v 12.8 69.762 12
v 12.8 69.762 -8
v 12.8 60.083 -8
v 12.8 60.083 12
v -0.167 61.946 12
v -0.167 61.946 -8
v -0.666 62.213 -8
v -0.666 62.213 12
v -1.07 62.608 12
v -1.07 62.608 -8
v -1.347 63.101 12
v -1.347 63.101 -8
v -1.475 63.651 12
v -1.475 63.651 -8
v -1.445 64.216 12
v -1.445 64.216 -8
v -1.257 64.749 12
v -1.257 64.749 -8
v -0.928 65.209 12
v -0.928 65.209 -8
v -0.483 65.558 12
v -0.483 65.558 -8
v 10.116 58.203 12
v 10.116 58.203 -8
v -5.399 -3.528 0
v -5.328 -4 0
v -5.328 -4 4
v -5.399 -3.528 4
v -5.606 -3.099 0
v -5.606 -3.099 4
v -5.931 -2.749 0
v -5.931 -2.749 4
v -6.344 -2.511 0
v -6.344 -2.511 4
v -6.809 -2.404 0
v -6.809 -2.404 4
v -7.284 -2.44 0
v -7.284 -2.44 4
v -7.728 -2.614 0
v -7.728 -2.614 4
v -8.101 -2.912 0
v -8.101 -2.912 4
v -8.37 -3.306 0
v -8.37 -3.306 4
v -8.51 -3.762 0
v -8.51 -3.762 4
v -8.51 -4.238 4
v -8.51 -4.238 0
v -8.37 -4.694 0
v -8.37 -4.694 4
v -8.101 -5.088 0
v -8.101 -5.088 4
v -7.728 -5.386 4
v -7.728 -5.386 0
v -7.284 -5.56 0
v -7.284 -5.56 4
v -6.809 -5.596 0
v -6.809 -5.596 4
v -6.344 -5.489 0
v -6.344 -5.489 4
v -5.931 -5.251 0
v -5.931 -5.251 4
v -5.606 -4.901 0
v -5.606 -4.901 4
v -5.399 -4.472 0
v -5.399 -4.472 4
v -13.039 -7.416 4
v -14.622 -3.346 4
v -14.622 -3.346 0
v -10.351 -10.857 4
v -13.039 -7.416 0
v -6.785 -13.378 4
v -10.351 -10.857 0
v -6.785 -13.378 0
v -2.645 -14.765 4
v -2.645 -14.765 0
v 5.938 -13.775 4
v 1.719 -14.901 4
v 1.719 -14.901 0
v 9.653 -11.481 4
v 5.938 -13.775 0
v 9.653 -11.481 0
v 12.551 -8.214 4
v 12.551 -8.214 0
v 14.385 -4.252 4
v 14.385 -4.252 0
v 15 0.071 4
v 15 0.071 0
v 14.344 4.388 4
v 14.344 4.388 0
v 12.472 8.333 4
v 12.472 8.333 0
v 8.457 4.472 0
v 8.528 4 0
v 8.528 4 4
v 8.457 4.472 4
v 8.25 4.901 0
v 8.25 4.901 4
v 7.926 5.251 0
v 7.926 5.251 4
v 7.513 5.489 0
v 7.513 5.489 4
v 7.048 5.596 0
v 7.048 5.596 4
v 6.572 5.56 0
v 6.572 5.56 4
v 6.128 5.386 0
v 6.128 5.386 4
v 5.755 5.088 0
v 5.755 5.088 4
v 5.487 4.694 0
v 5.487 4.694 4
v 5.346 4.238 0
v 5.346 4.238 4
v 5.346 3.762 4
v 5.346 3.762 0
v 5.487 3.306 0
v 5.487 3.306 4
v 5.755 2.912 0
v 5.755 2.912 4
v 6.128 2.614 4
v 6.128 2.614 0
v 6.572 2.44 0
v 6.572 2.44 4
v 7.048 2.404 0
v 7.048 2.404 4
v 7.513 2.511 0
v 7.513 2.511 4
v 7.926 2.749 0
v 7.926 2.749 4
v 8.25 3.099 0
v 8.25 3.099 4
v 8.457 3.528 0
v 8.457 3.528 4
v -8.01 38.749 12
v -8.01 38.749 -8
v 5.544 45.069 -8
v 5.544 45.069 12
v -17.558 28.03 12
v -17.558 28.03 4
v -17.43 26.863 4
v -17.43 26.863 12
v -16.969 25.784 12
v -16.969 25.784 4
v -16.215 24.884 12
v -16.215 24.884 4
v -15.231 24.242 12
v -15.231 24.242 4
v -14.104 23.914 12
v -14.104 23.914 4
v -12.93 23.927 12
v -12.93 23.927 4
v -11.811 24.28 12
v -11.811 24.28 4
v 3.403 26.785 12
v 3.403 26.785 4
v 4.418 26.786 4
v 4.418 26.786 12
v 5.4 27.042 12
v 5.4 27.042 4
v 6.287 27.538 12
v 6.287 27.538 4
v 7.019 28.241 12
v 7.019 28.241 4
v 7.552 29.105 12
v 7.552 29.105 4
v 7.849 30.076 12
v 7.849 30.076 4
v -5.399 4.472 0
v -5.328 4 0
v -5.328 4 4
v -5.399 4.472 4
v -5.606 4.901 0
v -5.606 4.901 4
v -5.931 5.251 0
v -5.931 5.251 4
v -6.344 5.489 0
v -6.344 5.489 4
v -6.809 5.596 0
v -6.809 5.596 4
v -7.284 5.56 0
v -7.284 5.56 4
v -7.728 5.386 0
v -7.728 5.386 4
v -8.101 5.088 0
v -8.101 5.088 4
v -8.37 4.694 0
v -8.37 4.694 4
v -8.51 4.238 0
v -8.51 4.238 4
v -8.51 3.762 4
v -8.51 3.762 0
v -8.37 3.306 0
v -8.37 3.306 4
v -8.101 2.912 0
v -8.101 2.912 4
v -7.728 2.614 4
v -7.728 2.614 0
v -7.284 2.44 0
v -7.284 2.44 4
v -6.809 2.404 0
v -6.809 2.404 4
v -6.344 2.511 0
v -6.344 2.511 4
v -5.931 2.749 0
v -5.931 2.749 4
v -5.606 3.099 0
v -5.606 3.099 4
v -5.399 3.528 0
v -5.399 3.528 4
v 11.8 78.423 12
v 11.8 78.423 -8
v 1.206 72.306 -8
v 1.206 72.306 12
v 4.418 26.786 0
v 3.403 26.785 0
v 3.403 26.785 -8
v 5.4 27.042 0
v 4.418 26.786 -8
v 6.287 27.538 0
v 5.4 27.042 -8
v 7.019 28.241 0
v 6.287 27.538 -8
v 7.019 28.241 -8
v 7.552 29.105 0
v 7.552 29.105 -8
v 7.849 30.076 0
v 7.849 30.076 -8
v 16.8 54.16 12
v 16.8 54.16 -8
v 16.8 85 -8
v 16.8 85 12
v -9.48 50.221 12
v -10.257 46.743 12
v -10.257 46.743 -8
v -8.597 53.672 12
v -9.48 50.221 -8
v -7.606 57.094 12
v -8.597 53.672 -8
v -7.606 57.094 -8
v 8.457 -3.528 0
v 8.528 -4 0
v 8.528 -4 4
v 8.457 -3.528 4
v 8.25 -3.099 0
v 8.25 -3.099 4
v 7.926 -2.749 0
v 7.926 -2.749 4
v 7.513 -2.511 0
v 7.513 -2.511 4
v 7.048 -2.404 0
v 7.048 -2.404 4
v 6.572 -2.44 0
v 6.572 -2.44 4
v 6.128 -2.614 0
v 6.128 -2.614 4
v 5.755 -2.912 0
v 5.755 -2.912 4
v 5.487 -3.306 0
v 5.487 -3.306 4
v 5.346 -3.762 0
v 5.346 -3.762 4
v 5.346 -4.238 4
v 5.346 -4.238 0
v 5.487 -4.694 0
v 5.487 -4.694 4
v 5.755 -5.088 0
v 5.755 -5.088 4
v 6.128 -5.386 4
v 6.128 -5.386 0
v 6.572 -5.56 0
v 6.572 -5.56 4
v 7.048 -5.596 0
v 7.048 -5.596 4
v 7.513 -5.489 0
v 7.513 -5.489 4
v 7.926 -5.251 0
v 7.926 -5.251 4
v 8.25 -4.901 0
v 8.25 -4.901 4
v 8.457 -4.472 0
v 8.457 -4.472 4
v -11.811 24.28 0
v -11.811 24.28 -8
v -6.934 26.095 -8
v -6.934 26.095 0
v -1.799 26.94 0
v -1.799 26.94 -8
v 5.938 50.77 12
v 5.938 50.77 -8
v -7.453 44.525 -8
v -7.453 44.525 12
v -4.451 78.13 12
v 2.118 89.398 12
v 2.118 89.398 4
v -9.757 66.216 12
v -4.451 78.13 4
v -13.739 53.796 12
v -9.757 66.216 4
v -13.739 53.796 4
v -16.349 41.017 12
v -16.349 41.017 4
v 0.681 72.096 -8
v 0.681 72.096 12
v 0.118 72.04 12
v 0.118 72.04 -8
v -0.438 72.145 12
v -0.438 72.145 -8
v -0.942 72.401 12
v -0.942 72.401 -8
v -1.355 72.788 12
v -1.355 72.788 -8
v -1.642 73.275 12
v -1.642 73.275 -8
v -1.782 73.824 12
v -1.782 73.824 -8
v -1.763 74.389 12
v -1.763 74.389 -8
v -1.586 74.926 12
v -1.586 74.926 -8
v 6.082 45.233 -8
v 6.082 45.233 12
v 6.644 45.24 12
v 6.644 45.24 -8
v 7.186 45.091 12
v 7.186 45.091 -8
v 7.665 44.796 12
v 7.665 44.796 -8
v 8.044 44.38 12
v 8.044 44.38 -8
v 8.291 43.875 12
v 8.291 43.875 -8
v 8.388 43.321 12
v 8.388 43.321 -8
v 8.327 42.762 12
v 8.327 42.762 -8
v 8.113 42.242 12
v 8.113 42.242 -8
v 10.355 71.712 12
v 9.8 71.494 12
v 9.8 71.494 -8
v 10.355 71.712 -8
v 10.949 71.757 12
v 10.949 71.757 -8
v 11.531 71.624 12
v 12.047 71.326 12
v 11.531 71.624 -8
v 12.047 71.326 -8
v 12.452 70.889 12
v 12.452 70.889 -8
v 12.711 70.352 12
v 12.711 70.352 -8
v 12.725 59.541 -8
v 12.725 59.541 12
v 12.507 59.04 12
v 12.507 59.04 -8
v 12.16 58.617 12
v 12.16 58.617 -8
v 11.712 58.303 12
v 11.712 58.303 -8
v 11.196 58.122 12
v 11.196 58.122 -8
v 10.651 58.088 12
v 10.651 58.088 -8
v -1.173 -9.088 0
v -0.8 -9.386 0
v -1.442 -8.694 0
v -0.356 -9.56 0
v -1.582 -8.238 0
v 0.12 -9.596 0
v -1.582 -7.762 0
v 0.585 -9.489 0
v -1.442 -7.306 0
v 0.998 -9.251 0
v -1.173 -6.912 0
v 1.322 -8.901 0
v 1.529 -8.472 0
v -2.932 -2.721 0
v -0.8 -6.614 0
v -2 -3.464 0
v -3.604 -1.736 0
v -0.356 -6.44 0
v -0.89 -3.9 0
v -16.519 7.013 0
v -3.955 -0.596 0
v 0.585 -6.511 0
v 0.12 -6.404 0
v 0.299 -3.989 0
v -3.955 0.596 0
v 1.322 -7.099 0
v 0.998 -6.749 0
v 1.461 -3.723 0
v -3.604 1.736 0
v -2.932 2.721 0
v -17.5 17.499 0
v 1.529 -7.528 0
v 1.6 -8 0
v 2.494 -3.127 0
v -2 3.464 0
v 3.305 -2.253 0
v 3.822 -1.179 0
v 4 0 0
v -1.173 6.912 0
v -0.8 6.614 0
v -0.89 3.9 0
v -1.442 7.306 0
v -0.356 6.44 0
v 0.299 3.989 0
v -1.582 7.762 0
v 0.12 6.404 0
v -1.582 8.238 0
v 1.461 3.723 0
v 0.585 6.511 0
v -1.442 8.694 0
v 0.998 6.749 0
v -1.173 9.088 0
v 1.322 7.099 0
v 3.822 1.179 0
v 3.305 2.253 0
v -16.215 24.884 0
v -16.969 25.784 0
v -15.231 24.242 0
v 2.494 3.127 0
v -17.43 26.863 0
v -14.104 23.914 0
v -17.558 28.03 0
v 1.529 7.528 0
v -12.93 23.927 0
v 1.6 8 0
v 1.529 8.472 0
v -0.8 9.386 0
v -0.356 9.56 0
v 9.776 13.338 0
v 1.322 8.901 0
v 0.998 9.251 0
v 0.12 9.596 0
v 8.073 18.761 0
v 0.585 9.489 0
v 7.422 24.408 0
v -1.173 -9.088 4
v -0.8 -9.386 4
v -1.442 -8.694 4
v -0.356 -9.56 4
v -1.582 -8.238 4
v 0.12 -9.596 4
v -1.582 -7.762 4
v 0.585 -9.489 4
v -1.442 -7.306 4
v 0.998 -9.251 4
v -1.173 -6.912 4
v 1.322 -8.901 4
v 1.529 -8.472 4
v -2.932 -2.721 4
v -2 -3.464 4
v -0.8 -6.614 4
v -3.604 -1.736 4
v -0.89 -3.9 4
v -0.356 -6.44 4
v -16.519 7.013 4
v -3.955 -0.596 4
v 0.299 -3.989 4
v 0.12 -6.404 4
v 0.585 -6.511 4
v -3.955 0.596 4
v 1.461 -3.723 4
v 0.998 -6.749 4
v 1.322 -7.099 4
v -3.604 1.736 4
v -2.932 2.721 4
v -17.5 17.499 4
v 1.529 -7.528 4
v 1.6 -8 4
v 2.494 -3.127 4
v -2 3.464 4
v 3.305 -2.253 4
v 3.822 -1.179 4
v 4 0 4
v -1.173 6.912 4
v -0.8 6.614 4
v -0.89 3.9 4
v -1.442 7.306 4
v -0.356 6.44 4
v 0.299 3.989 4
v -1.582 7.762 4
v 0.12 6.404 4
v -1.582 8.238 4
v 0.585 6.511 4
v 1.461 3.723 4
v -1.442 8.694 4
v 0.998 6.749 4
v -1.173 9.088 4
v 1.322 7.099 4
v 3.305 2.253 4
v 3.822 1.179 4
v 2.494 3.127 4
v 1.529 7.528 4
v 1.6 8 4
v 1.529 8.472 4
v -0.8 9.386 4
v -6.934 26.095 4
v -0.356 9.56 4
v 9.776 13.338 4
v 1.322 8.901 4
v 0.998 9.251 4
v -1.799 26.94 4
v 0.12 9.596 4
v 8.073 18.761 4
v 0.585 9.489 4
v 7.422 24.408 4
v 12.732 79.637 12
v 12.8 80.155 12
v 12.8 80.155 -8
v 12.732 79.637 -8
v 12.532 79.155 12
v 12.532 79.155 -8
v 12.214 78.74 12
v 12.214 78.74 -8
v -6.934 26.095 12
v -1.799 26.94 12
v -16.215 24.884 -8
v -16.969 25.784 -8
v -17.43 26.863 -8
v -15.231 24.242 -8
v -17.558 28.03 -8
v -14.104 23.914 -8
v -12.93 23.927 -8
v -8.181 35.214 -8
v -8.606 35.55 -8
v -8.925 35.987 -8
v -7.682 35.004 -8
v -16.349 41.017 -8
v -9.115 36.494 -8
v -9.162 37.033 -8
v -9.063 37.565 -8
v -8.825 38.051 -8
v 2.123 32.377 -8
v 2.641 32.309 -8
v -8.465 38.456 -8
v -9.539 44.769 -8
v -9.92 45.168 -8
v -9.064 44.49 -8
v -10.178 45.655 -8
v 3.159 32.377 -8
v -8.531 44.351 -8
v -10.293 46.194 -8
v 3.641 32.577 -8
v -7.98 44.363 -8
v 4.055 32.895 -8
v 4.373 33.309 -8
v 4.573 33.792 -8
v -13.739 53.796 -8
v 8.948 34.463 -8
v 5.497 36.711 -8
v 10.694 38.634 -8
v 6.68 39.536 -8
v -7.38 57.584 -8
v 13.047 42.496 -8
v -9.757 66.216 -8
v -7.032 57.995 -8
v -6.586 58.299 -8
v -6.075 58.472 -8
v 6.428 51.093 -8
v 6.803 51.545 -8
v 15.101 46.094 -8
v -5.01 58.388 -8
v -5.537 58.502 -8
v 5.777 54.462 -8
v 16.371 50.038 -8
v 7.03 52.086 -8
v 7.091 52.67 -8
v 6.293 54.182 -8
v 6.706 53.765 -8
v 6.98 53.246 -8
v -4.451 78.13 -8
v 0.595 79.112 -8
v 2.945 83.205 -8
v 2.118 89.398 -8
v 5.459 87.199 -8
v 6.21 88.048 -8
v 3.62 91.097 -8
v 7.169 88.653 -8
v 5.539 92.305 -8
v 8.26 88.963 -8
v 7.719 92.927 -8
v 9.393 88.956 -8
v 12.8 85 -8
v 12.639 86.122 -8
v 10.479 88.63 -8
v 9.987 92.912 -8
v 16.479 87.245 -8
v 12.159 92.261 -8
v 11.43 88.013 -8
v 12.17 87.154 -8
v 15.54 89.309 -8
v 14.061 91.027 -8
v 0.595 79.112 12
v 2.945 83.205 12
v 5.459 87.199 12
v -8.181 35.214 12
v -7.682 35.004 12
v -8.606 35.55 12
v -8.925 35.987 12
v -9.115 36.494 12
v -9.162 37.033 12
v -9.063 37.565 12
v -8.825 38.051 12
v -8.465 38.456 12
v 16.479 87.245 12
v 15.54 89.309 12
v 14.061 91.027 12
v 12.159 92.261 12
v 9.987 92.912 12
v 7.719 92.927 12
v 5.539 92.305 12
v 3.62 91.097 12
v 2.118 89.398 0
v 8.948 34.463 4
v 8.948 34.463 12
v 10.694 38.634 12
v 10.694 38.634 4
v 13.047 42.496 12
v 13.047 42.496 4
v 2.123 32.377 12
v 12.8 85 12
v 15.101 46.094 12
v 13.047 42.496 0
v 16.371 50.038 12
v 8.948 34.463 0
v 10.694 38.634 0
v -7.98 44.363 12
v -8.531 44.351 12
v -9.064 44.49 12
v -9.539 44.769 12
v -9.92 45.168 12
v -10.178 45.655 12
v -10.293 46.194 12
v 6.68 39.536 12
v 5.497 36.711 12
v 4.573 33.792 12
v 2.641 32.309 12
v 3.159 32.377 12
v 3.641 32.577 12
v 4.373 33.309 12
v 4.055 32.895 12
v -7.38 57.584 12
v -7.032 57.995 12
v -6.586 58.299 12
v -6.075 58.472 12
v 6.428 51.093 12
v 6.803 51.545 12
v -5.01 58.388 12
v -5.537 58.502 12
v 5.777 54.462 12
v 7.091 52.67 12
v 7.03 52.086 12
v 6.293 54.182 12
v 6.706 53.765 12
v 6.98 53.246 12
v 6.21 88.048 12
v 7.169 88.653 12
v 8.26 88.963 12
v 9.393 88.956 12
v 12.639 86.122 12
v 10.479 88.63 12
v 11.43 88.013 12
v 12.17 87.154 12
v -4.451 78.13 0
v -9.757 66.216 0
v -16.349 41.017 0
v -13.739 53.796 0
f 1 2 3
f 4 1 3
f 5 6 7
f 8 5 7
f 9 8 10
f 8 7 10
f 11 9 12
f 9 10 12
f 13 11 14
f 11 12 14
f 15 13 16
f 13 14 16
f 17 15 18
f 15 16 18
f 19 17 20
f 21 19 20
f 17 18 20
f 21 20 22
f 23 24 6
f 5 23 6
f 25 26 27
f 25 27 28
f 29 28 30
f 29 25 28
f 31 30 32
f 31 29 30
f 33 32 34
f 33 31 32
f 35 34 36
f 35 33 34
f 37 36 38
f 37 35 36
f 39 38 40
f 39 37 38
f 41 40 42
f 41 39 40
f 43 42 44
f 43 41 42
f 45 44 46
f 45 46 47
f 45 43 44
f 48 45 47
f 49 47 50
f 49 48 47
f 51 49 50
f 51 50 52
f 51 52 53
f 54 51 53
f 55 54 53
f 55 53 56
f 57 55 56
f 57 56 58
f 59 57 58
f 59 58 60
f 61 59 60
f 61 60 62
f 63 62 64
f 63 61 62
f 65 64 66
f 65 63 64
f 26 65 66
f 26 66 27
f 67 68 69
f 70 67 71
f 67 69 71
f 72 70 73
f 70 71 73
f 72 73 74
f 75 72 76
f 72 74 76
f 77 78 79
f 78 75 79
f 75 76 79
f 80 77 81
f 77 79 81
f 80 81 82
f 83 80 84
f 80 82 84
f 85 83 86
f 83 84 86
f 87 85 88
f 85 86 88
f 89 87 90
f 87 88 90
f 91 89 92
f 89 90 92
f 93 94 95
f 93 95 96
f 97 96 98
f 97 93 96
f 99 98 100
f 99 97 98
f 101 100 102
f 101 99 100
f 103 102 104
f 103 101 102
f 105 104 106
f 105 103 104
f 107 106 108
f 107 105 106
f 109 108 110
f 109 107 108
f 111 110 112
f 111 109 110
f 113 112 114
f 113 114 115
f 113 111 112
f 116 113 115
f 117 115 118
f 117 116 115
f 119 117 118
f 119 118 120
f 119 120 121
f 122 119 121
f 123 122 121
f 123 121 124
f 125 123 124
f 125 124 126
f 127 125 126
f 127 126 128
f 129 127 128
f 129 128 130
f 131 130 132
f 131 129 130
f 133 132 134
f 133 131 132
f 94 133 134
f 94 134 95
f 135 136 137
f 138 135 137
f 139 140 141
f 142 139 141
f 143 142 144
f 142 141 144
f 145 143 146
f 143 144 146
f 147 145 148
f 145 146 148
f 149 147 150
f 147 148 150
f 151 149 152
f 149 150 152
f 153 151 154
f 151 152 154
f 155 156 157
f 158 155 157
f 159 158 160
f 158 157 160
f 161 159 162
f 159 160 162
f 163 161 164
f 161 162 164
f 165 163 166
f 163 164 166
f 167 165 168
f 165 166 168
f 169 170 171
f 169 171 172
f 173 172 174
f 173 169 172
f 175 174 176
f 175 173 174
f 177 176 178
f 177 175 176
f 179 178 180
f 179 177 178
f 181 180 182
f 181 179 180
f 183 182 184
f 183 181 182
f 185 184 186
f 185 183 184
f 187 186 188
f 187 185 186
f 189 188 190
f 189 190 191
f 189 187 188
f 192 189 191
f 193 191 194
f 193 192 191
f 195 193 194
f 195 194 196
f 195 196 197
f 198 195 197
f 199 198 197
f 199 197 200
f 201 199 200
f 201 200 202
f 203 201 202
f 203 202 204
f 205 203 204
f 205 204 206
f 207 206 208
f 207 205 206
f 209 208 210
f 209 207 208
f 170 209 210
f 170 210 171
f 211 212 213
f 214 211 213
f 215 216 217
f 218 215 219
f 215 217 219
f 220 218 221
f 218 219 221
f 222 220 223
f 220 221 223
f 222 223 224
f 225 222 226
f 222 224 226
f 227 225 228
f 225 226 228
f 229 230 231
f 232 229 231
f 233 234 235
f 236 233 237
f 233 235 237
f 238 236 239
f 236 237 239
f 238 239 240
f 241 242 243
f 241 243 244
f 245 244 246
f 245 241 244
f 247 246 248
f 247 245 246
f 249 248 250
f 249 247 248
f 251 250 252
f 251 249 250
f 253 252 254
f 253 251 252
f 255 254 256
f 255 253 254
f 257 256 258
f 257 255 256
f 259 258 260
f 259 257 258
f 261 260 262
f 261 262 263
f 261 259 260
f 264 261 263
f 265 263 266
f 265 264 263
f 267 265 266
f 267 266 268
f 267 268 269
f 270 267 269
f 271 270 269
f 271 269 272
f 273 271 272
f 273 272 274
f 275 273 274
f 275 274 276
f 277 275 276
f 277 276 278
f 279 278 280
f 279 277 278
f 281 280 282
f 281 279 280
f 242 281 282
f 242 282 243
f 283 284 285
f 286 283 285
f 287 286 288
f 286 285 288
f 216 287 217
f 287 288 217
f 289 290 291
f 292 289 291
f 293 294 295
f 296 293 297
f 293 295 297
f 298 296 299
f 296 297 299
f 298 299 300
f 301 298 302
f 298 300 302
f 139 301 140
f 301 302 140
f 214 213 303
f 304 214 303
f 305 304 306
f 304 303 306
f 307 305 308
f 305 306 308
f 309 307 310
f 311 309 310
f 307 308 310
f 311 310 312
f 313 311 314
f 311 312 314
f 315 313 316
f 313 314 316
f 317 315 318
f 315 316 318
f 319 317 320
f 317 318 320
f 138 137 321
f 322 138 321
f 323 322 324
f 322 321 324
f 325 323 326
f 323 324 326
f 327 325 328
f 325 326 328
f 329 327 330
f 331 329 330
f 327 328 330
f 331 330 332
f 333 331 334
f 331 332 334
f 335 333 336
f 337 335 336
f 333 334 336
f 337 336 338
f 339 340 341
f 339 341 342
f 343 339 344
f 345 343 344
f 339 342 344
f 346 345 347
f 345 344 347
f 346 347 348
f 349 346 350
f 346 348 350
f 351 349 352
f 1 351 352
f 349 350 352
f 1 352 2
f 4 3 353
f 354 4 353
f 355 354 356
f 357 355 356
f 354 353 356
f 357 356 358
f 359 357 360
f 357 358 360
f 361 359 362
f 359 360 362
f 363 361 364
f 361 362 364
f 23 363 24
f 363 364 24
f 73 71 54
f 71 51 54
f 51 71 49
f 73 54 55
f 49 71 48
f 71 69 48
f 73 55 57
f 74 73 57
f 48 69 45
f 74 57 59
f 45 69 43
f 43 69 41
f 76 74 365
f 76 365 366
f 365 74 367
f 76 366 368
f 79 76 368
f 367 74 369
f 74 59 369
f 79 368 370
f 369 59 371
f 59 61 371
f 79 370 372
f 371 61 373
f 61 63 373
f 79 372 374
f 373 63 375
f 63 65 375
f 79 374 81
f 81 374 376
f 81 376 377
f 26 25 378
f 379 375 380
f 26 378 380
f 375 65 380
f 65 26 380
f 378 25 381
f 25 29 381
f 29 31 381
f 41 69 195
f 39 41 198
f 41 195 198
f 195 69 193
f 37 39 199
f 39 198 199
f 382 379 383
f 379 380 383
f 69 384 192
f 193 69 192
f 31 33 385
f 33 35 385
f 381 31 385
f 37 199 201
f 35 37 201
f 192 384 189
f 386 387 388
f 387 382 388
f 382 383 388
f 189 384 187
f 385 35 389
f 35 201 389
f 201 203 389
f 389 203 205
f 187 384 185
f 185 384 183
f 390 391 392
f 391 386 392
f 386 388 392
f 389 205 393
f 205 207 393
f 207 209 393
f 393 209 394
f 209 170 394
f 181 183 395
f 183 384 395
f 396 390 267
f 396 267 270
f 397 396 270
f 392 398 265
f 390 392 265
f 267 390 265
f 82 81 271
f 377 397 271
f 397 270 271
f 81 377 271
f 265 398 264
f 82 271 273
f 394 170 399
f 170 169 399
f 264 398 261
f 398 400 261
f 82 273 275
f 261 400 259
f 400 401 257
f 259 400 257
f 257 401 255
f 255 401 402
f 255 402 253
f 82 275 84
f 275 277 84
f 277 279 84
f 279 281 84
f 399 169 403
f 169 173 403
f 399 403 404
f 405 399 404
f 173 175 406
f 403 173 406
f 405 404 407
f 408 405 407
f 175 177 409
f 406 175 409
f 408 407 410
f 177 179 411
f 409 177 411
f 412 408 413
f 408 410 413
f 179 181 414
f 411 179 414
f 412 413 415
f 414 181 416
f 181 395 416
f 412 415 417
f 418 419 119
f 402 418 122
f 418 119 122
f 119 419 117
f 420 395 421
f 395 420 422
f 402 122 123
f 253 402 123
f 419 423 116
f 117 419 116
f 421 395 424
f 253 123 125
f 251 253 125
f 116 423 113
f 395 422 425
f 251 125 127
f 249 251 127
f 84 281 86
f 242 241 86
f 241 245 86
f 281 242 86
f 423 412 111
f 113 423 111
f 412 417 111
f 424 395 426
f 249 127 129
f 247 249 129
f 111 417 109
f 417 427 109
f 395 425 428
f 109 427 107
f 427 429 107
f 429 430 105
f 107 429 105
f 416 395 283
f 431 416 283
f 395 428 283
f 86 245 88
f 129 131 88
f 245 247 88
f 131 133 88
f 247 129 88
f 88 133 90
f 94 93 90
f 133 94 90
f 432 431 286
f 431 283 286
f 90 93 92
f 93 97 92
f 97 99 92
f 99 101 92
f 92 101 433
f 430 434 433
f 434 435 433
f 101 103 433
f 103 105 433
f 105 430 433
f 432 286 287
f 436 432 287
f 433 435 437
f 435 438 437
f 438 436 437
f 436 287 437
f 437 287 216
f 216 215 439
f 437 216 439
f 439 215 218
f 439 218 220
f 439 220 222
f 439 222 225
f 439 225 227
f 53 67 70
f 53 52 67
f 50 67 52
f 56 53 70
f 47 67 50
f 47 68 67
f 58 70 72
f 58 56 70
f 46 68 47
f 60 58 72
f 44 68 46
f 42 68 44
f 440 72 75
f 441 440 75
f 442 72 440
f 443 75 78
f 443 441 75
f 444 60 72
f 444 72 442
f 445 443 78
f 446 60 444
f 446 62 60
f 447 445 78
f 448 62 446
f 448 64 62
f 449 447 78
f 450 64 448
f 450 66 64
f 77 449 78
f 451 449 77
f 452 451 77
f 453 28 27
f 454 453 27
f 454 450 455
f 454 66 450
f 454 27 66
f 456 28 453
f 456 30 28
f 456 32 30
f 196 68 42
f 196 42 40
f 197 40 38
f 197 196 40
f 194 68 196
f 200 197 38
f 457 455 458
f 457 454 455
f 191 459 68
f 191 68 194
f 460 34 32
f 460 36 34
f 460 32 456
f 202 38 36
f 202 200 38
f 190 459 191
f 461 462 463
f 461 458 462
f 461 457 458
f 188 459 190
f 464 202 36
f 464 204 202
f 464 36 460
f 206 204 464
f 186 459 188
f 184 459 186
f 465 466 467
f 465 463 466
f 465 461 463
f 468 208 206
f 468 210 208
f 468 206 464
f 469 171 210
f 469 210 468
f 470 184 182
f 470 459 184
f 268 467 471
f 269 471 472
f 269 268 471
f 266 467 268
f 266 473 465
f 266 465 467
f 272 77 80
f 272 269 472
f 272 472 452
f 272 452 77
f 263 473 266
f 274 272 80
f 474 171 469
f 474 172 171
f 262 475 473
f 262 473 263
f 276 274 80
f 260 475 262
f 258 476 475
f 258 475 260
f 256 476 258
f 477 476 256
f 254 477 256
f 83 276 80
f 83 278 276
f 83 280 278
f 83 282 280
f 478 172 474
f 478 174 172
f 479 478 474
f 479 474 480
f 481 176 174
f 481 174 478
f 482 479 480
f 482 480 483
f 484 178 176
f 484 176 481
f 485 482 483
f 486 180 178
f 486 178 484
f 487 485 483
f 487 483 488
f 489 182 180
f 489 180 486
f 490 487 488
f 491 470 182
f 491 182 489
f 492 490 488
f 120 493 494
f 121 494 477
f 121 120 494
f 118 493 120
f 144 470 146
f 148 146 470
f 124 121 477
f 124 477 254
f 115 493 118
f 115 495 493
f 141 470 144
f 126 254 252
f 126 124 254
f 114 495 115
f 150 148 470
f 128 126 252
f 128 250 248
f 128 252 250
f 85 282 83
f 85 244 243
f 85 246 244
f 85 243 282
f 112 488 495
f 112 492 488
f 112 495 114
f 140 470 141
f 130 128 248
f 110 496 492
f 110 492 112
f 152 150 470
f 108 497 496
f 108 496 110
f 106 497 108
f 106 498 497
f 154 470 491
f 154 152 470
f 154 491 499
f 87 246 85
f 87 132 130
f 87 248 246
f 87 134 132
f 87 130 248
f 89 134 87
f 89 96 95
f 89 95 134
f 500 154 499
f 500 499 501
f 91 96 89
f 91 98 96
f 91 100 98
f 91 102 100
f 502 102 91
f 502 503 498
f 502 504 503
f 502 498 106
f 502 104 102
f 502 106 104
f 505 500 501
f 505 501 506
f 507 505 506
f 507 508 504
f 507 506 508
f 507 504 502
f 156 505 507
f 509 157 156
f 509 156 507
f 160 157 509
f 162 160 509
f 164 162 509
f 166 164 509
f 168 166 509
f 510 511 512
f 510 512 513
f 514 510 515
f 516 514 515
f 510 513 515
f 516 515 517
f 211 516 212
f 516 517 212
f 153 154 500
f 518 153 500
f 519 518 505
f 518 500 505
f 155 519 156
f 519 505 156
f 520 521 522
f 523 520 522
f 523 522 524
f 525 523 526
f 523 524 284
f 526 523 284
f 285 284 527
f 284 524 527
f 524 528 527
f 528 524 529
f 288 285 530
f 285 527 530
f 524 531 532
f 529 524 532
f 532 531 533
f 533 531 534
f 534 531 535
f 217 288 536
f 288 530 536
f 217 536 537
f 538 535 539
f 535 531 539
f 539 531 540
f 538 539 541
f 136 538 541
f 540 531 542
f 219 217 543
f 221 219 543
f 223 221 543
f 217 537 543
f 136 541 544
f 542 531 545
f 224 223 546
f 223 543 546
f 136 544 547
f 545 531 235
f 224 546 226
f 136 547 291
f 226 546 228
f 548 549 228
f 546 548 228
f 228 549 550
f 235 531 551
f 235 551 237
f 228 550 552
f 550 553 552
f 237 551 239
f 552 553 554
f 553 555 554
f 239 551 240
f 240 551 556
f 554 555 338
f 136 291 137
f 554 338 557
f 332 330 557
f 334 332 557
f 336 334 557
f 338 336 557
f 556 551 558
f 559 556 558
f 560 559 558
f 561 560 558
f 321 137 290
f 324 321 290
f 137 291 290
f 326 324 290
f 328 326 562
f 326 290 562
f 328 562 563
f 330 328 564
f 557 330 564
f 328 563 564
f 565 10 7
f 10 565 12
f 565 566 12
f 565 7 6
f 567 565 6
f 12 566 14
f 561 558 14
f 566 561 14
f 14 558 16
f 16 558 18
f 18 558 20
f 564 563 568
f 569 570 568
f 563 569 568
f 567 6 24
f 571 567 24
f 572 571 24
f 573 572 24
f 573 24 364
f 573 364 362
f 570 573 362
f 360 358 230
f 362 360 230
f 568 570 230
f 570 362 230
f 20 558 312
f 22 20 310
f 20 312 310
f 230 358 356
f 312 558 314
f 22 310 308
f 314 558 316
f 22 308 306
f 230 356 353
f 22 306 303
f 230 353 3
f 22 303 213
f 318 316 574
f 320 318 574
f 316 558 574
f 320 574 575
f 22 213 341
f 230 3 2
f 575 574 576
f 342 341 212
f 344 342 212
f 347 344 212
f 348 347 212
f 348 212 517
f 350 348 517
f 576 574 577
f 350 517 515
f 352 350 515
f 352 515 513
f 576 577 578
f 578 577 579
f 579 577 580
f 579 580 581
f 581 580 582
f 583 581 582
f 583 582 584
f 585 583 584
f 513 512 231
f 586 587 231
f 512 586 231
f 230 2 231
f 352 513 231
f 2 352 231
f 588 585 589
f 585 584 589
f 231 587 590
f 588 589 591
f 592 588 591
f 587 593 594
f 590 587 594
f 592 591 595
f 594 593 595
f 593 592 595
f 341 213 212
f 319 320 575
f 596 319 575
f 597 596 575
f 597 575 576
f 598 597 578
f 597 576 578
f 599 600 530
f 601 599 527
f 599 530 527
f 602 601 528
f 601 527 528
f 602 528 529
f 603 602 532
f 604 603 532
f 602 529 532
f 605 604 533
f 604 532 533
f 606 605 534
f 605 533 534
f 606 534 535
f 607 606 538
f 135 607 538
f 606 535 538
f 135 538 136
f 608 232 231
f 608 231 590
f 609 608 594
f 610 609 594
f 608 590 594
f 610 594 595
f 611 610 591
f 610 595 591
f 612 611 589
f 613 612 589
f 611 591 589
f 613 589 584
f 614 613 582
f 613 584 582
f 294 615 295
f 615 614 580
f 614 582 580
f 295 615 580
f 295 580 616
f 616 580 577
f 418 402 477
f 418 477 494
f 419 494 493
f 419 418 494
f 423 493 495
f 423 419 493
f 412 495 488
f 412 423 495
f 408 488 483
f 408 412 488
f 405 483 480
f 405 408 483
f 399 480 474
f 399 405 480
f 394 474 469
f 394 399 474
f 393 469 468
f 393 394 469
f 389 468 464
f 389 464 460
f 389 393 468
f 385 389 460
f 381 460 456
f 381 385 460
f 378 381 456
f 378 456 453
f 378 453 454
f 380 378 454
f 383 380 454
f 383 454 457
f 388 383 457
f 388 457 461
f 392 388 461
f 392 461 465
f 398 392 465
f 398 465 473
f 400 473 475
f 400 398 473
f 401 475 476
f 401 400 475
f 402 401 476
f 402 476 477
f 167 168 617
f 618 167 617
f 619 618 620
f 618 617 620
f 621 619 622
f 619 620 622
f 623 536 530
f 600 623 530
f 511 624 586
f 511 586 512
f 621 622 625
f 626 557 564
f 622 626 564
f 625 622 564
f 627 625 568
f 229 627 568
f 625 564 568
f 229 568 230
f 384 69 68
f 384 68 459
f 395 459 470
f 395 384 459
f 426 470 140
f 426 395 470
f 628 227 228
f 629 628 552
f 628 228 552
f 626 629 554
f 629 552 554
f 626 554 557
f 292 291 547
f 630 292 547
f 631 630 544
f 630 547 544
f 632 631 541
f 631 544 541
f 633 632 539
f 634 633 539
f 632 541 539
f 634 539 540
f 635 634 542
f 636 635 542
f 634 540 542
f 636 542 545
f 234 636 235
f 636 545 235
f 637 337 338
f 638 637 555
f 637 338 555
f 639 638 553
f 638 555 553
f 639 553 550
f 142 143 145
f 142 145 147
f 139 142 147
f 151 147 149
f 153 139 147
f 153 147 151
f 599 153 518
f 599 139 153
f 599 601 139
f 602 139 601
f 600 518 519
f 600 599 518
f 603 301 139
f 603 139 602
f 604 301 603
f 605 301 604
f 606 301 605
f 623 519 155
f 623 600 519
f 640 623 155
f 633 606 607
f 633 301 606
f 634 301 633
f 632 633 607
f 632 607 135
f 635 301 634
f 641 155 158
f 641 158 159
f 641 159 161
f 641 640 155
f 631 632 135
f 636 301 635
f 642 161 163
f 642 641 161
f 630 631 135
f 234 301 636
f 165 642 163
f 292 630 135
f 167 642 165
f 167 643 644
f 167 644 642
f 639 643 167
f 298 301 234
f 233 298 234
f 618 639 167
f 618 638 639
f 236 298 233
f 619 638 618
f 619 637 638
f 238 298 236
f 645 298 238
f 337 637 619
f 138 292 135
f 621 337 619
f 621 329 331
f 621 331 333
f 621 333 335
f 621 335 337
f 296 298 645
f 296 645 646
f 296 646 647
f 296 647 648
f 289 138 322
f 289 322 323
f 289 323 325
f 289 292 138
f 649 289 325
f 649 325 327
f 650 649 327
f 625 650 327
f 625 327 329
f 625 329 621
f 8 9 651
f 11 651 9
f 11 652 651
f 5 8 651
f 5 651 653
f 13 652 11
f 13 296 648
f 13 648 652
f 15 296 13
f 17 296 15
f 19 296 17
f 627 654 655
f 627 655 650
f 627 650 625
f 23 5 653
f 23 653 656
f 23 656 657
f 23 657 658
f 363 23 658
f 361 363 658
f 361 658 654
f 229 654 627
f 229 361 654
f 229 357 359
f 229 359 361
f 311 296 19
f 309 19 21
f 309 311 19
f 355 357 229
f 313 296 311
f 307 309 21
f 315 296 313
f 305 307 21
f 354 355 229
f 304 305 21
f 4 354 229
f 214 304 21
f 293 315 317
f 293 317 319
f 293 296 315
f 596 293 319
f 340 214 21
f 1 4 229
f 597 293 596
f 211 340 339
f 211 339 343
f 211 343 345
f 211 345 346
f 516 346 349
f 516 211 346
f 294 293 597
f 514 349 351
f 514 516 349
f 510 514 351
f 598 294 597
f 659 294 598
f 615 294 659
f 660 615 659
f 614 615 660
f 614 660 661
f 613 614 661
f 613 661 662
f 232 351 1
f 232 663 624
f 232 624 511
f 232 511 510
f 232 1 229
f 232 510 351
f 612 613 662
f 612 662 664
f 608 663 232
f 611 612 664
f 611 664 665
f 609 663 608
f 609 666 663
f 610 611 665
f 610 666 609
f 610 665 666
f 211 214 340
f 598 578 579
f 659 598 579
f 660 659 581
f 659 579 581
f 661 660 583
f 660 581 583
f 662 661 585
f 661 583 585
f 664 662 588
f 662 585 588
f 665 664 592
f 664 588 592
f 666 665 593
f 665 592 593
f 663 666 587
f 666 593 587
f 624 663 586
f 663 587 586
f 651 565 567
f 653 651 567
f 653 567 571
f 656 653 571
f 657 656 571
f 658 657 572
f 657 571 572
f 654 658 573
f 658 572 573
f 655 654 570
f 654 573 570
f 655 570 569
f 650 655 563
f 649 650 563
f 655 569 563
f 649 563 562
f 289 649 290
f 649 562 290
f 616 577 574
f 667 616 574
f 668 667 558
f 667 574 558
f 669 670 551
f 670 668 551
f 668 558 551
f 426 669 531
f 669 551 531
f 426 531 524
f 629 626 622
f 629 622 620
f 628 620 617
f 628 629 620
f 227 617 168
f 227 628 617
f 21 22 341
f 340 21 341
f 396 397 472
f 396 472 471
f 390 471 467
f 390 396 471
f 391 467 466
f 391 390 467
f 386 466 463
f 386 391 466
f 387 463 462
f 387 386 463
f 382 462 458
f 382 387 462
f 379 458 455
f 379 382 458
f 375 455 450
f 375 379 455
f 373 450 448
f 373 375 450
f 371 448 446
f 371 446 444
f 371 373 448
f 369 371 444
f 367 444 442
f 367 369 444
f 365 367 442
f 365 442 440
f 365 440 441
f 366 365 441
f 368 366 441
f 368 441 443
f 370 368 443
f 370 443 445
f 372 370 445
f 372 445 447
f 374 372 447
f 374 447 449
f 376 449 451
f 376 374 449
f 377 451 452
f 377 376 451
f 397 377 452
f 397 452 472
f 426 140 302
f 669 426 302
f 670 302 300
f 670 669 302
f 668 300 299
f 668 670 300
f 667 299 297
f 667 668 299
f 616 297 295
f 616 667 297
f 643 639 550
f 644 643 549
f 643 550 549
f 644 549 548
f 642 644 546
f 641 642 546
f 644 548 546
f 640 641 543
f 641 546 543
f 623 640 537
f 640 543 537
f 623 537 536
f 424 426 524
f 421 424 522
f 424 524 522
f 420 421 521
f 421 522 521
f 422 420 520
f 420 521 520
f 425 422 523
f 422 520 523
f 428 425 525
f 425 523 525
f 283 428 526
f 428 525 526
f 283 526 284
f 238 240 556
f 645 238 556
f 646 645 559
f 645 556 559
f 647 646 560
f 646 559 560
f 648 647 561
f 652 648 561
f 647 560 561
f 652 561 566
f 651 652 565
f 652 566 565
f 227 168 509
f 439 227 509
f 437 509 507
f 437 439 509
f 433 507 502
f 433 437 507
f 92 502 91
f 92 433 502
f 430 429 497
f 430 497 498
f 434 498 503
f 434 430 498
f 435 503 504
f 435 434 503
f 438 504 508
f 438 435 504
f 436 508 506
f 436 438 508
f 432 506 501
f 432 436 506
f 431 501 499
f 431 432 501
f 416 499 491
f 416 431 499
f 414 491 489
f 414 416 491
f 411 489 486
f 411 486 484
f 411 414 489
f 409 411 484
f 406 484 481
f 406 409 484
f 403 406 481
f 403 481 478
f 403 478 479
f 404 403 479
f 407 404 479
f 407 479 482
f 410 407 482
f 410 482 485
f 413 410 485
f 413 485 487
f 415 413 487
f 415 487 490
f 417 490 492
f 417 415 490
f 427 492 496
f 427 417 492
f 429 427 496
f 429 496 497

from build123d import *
from build123d.topology import SkipClean

# Parameters (mm, degrees)
SKETCH_1_R           = 15
SKETCH_1_R_2         = 4
SKETCH_1_R_3         = 1.6
EXTRUDE_1_DEPTH      = 4
EXTRUDE_START        = -4
EXTRUDE_3_DEPTH      = 4
EXTRUDE_4_DEPTH      = 8
EXTRUDE_4_DEPTH_BACK = 12
CUT_EXTRUDE_1_DEPTH  = 46


with BuildPart() as part:
    # 草图1 → 凸台-拉伸1 (new body)
    with BuildSketch(Plane.XY):
        Circle(SKETCH_1_R)
        Circle(SKETCH_1_R_2, mode=Mode.SUBTRACT)
        with Locations((0, 8)):
            Circle(SKETCH_1_R_3, mode=Mode.SUBTRACT)
        with Locations((6.92820323, 4)):
            Circle(SKETCH_1_R_3, mode=Mode.SUBTRACT)
        with Locations((6.92820323, -4)):
            Circle(SKETCH_1_R_3, mode=Mode.SUBTRACT)
        with Locations((0, -8)):
            Circle(SKETCH_1_R_3, mode=Mode.SUBTRACT)
        with Locations((-6.92820323, -4)):
            Circle(SKETCH_1_R_3, mode=Mode.SUBTRACT)
        with Locations((-6.92820323, 4)):
            Circle(SKETCH_1_R_3, mode=Mode.SUBTRACT)
    extrude(amount=EXTRUDE_1_DEPTH)

    # 草图2 → 凸台-拉伸3 (add)
    with BuildSketch(Plane.XY.offset(4).offset(EXTRUDE_START)):
        with BuildLine():
            Line((16.8, 85), (16.8, 54.159799849))
            ThreePointArc((16.8, 54.159799849), (15.83854762, 48.033324147), (13.046629547, 42.49587991))
            ThreePointArc((13.046629547, 42.49587991), (7.420814059, 25.504374344), (12.472191289, 8.333333333))
            ThreePointArc((12.472191289, 8.333333333), (-5.937882388, 13.774670695), (-14.621995932, -3.346226976))
            ThreePointArc((-14.621995932, -3.346226976), (-15.737901413, 44.738127218), (2.117573463, 89.398315084))
            ThreePointArc((2.117573463, 89.398315084), (11.095712057, 92.663530919), (16.8, 85))
        make_face()
    extrude(amount=EXTRUDE_3_DEPTH)

    # 草图3 → 凸台-拉伸4 (add, two sides: drawn at the far end of the back side and taken through both)
    with SkipClean():  # the faces are left unmerged after this step: merging them gives an invalid solid
        with BuildSketch(Plane.XY.offset(4).offset(-EXTRUDE_4_DEPTH_BACK)):
            with BuildLine():
                Line((16.8, 54.159799849), (16.8, 85))
                ThreePointArc((16.8, 85), (11.095712057, 92.663530919), (2.117573463, 89.398315084))
                ThreePointArc((2.117573463, 89.398315084), (-11.916705707, 60.059804871), (-17.55757213, 28.030290369))
                ThreePointArc((-17.55757213, 28.030290369), (-15.746673, 24.526996644), (-11.810776072, 24.27973576))
                ThreePointArc((-11.810776072, 24.27973576), (-4.386649325, 26.64127076), (3.402697603, 26.784727906))
                ThreePointArc((3.402697603, 26.784727906), (6.286614818, 27.53779516), (7.849127177, 30.076031539))
                ThreePointArc((7.849127177, 30.076031539), (9.742150736, 36.581291134), (13.046629547, 42.49587991))
                ThreePointArc((13.046629547, 42.49587991), (15.83854762, 48.033324147), (16.8, 54.159799849))
            make_face()
        extrude(amount=EXTRUDE_4_DEPTH + EXTRUDE_4_DEPTH_BACK)
    add(part.part.scale(1), mode=Mode.REPLACE)  # the faces are merged on a copy

    # 草图5 → 切除-拉伸1 (cut)
    with BuildSketch(Plane(origin=(0, 0, -8), x_dir=(-1, 0, 0), z_dir=(0, 0, -1))):
        with BuildLine():
            Line((-12.8, 69.762395693), (-12.8, 60.082793322))
            ThreePointArc((-12.8, 60.082793322), (-11.947152873, 58.444489233), (-10.115959713, 58.20340808))
            Line((-10.115959713, 58.20340808), (0.167044148, 61.946115404))
            ThreePointArc((0.167044148, 61.946115404), (1.475393257, 63.65118916), (0.483003861, 65.557551453))
            Line((0.483003861, 65.557551453), (-9.8, 71.494446501))
            ThreePointArc((-9.8, 71.494446501), (-11.8, 71.494446501), (-12.8, 69.762395693))
        make_face()
        with BuildLine():
            Line((-11.8, 78.422649731), (-1.206357847, 72.306407582))
            ThreePointArc((-1.206357847, 72.306407582), (1.162211364, 72.580028303), (1.585705551, 74.926438557))
            ThreePointArc((1.585705551, 74.926438557), (-1.749223409, 81.170317372), (-5.458786731, 87.199157542))
            ThreePointArc((-5.458786731, 87.199157542), (-9.947856029, 88.83176546), (-12.8, 85))
            Line((-12.8, 85), (-12.8, 80.154700538))
            ThreePointArc((-12.8, 80.154700538), (-12.532050808, 79.154700538), (-11.8, 78.422649731))
        make_face()
        with BuildLine():
            Line((5.01005666, 58.38793894), (-5.776995128, 54.461773174))
            ThreePointArc((-5.776995128, 54.461773174), (-7.091051284, 52.669626708), (-5.938191364, 50.769772359))
            Line((-5.938191364, 50.769772359), (7.453099332, 44.525310955))
            ThreePointArc((7.453099332, 44.525310955), (9.539258698, 44.76945259), (10.256783773, 46.743490028))
            ThreePointArc((10.256783773, 46.743490028), (9.051891671, 51.949605837), (7.60645214, 57.094128298))
            ThreePointArc((7.60645214, 57.094128298), (6.586103601, 58.298616303), (5.01005666, 58.38793894))
        make_face()
        with BuildLine():
            Line((-2.123332063, 32.377143259), (7.681973135, 35.004466868))
            ThreePointArc((7.681973135, 35.004466868), (9.156724441, 36.762007035), (8.009571568, 38.748934095))
            Line((8.009571568, 38.748934095), (-5.543860738, 45.069003373))
            ThreePointArc((-5.543860738, 45.069003373), (-7.869208523, 44.601479118), (-8.112845962, 42.242144033))
            ThreePointArc((-8.112845962, 42.242144033), (-6.056960525, 38.136767143), (-4.572948137, 33.791828527))
            ThreePointArc((-4.572948137, 33.791828527), (-3.641181599, 32.577066199), (-2.123332063, 32.377143259))
        make_face()
    extrude(amount=-CUT_EXTRUDE_1_DEPTH, mode=Mode.SUBTRACT)


solid = part.part
